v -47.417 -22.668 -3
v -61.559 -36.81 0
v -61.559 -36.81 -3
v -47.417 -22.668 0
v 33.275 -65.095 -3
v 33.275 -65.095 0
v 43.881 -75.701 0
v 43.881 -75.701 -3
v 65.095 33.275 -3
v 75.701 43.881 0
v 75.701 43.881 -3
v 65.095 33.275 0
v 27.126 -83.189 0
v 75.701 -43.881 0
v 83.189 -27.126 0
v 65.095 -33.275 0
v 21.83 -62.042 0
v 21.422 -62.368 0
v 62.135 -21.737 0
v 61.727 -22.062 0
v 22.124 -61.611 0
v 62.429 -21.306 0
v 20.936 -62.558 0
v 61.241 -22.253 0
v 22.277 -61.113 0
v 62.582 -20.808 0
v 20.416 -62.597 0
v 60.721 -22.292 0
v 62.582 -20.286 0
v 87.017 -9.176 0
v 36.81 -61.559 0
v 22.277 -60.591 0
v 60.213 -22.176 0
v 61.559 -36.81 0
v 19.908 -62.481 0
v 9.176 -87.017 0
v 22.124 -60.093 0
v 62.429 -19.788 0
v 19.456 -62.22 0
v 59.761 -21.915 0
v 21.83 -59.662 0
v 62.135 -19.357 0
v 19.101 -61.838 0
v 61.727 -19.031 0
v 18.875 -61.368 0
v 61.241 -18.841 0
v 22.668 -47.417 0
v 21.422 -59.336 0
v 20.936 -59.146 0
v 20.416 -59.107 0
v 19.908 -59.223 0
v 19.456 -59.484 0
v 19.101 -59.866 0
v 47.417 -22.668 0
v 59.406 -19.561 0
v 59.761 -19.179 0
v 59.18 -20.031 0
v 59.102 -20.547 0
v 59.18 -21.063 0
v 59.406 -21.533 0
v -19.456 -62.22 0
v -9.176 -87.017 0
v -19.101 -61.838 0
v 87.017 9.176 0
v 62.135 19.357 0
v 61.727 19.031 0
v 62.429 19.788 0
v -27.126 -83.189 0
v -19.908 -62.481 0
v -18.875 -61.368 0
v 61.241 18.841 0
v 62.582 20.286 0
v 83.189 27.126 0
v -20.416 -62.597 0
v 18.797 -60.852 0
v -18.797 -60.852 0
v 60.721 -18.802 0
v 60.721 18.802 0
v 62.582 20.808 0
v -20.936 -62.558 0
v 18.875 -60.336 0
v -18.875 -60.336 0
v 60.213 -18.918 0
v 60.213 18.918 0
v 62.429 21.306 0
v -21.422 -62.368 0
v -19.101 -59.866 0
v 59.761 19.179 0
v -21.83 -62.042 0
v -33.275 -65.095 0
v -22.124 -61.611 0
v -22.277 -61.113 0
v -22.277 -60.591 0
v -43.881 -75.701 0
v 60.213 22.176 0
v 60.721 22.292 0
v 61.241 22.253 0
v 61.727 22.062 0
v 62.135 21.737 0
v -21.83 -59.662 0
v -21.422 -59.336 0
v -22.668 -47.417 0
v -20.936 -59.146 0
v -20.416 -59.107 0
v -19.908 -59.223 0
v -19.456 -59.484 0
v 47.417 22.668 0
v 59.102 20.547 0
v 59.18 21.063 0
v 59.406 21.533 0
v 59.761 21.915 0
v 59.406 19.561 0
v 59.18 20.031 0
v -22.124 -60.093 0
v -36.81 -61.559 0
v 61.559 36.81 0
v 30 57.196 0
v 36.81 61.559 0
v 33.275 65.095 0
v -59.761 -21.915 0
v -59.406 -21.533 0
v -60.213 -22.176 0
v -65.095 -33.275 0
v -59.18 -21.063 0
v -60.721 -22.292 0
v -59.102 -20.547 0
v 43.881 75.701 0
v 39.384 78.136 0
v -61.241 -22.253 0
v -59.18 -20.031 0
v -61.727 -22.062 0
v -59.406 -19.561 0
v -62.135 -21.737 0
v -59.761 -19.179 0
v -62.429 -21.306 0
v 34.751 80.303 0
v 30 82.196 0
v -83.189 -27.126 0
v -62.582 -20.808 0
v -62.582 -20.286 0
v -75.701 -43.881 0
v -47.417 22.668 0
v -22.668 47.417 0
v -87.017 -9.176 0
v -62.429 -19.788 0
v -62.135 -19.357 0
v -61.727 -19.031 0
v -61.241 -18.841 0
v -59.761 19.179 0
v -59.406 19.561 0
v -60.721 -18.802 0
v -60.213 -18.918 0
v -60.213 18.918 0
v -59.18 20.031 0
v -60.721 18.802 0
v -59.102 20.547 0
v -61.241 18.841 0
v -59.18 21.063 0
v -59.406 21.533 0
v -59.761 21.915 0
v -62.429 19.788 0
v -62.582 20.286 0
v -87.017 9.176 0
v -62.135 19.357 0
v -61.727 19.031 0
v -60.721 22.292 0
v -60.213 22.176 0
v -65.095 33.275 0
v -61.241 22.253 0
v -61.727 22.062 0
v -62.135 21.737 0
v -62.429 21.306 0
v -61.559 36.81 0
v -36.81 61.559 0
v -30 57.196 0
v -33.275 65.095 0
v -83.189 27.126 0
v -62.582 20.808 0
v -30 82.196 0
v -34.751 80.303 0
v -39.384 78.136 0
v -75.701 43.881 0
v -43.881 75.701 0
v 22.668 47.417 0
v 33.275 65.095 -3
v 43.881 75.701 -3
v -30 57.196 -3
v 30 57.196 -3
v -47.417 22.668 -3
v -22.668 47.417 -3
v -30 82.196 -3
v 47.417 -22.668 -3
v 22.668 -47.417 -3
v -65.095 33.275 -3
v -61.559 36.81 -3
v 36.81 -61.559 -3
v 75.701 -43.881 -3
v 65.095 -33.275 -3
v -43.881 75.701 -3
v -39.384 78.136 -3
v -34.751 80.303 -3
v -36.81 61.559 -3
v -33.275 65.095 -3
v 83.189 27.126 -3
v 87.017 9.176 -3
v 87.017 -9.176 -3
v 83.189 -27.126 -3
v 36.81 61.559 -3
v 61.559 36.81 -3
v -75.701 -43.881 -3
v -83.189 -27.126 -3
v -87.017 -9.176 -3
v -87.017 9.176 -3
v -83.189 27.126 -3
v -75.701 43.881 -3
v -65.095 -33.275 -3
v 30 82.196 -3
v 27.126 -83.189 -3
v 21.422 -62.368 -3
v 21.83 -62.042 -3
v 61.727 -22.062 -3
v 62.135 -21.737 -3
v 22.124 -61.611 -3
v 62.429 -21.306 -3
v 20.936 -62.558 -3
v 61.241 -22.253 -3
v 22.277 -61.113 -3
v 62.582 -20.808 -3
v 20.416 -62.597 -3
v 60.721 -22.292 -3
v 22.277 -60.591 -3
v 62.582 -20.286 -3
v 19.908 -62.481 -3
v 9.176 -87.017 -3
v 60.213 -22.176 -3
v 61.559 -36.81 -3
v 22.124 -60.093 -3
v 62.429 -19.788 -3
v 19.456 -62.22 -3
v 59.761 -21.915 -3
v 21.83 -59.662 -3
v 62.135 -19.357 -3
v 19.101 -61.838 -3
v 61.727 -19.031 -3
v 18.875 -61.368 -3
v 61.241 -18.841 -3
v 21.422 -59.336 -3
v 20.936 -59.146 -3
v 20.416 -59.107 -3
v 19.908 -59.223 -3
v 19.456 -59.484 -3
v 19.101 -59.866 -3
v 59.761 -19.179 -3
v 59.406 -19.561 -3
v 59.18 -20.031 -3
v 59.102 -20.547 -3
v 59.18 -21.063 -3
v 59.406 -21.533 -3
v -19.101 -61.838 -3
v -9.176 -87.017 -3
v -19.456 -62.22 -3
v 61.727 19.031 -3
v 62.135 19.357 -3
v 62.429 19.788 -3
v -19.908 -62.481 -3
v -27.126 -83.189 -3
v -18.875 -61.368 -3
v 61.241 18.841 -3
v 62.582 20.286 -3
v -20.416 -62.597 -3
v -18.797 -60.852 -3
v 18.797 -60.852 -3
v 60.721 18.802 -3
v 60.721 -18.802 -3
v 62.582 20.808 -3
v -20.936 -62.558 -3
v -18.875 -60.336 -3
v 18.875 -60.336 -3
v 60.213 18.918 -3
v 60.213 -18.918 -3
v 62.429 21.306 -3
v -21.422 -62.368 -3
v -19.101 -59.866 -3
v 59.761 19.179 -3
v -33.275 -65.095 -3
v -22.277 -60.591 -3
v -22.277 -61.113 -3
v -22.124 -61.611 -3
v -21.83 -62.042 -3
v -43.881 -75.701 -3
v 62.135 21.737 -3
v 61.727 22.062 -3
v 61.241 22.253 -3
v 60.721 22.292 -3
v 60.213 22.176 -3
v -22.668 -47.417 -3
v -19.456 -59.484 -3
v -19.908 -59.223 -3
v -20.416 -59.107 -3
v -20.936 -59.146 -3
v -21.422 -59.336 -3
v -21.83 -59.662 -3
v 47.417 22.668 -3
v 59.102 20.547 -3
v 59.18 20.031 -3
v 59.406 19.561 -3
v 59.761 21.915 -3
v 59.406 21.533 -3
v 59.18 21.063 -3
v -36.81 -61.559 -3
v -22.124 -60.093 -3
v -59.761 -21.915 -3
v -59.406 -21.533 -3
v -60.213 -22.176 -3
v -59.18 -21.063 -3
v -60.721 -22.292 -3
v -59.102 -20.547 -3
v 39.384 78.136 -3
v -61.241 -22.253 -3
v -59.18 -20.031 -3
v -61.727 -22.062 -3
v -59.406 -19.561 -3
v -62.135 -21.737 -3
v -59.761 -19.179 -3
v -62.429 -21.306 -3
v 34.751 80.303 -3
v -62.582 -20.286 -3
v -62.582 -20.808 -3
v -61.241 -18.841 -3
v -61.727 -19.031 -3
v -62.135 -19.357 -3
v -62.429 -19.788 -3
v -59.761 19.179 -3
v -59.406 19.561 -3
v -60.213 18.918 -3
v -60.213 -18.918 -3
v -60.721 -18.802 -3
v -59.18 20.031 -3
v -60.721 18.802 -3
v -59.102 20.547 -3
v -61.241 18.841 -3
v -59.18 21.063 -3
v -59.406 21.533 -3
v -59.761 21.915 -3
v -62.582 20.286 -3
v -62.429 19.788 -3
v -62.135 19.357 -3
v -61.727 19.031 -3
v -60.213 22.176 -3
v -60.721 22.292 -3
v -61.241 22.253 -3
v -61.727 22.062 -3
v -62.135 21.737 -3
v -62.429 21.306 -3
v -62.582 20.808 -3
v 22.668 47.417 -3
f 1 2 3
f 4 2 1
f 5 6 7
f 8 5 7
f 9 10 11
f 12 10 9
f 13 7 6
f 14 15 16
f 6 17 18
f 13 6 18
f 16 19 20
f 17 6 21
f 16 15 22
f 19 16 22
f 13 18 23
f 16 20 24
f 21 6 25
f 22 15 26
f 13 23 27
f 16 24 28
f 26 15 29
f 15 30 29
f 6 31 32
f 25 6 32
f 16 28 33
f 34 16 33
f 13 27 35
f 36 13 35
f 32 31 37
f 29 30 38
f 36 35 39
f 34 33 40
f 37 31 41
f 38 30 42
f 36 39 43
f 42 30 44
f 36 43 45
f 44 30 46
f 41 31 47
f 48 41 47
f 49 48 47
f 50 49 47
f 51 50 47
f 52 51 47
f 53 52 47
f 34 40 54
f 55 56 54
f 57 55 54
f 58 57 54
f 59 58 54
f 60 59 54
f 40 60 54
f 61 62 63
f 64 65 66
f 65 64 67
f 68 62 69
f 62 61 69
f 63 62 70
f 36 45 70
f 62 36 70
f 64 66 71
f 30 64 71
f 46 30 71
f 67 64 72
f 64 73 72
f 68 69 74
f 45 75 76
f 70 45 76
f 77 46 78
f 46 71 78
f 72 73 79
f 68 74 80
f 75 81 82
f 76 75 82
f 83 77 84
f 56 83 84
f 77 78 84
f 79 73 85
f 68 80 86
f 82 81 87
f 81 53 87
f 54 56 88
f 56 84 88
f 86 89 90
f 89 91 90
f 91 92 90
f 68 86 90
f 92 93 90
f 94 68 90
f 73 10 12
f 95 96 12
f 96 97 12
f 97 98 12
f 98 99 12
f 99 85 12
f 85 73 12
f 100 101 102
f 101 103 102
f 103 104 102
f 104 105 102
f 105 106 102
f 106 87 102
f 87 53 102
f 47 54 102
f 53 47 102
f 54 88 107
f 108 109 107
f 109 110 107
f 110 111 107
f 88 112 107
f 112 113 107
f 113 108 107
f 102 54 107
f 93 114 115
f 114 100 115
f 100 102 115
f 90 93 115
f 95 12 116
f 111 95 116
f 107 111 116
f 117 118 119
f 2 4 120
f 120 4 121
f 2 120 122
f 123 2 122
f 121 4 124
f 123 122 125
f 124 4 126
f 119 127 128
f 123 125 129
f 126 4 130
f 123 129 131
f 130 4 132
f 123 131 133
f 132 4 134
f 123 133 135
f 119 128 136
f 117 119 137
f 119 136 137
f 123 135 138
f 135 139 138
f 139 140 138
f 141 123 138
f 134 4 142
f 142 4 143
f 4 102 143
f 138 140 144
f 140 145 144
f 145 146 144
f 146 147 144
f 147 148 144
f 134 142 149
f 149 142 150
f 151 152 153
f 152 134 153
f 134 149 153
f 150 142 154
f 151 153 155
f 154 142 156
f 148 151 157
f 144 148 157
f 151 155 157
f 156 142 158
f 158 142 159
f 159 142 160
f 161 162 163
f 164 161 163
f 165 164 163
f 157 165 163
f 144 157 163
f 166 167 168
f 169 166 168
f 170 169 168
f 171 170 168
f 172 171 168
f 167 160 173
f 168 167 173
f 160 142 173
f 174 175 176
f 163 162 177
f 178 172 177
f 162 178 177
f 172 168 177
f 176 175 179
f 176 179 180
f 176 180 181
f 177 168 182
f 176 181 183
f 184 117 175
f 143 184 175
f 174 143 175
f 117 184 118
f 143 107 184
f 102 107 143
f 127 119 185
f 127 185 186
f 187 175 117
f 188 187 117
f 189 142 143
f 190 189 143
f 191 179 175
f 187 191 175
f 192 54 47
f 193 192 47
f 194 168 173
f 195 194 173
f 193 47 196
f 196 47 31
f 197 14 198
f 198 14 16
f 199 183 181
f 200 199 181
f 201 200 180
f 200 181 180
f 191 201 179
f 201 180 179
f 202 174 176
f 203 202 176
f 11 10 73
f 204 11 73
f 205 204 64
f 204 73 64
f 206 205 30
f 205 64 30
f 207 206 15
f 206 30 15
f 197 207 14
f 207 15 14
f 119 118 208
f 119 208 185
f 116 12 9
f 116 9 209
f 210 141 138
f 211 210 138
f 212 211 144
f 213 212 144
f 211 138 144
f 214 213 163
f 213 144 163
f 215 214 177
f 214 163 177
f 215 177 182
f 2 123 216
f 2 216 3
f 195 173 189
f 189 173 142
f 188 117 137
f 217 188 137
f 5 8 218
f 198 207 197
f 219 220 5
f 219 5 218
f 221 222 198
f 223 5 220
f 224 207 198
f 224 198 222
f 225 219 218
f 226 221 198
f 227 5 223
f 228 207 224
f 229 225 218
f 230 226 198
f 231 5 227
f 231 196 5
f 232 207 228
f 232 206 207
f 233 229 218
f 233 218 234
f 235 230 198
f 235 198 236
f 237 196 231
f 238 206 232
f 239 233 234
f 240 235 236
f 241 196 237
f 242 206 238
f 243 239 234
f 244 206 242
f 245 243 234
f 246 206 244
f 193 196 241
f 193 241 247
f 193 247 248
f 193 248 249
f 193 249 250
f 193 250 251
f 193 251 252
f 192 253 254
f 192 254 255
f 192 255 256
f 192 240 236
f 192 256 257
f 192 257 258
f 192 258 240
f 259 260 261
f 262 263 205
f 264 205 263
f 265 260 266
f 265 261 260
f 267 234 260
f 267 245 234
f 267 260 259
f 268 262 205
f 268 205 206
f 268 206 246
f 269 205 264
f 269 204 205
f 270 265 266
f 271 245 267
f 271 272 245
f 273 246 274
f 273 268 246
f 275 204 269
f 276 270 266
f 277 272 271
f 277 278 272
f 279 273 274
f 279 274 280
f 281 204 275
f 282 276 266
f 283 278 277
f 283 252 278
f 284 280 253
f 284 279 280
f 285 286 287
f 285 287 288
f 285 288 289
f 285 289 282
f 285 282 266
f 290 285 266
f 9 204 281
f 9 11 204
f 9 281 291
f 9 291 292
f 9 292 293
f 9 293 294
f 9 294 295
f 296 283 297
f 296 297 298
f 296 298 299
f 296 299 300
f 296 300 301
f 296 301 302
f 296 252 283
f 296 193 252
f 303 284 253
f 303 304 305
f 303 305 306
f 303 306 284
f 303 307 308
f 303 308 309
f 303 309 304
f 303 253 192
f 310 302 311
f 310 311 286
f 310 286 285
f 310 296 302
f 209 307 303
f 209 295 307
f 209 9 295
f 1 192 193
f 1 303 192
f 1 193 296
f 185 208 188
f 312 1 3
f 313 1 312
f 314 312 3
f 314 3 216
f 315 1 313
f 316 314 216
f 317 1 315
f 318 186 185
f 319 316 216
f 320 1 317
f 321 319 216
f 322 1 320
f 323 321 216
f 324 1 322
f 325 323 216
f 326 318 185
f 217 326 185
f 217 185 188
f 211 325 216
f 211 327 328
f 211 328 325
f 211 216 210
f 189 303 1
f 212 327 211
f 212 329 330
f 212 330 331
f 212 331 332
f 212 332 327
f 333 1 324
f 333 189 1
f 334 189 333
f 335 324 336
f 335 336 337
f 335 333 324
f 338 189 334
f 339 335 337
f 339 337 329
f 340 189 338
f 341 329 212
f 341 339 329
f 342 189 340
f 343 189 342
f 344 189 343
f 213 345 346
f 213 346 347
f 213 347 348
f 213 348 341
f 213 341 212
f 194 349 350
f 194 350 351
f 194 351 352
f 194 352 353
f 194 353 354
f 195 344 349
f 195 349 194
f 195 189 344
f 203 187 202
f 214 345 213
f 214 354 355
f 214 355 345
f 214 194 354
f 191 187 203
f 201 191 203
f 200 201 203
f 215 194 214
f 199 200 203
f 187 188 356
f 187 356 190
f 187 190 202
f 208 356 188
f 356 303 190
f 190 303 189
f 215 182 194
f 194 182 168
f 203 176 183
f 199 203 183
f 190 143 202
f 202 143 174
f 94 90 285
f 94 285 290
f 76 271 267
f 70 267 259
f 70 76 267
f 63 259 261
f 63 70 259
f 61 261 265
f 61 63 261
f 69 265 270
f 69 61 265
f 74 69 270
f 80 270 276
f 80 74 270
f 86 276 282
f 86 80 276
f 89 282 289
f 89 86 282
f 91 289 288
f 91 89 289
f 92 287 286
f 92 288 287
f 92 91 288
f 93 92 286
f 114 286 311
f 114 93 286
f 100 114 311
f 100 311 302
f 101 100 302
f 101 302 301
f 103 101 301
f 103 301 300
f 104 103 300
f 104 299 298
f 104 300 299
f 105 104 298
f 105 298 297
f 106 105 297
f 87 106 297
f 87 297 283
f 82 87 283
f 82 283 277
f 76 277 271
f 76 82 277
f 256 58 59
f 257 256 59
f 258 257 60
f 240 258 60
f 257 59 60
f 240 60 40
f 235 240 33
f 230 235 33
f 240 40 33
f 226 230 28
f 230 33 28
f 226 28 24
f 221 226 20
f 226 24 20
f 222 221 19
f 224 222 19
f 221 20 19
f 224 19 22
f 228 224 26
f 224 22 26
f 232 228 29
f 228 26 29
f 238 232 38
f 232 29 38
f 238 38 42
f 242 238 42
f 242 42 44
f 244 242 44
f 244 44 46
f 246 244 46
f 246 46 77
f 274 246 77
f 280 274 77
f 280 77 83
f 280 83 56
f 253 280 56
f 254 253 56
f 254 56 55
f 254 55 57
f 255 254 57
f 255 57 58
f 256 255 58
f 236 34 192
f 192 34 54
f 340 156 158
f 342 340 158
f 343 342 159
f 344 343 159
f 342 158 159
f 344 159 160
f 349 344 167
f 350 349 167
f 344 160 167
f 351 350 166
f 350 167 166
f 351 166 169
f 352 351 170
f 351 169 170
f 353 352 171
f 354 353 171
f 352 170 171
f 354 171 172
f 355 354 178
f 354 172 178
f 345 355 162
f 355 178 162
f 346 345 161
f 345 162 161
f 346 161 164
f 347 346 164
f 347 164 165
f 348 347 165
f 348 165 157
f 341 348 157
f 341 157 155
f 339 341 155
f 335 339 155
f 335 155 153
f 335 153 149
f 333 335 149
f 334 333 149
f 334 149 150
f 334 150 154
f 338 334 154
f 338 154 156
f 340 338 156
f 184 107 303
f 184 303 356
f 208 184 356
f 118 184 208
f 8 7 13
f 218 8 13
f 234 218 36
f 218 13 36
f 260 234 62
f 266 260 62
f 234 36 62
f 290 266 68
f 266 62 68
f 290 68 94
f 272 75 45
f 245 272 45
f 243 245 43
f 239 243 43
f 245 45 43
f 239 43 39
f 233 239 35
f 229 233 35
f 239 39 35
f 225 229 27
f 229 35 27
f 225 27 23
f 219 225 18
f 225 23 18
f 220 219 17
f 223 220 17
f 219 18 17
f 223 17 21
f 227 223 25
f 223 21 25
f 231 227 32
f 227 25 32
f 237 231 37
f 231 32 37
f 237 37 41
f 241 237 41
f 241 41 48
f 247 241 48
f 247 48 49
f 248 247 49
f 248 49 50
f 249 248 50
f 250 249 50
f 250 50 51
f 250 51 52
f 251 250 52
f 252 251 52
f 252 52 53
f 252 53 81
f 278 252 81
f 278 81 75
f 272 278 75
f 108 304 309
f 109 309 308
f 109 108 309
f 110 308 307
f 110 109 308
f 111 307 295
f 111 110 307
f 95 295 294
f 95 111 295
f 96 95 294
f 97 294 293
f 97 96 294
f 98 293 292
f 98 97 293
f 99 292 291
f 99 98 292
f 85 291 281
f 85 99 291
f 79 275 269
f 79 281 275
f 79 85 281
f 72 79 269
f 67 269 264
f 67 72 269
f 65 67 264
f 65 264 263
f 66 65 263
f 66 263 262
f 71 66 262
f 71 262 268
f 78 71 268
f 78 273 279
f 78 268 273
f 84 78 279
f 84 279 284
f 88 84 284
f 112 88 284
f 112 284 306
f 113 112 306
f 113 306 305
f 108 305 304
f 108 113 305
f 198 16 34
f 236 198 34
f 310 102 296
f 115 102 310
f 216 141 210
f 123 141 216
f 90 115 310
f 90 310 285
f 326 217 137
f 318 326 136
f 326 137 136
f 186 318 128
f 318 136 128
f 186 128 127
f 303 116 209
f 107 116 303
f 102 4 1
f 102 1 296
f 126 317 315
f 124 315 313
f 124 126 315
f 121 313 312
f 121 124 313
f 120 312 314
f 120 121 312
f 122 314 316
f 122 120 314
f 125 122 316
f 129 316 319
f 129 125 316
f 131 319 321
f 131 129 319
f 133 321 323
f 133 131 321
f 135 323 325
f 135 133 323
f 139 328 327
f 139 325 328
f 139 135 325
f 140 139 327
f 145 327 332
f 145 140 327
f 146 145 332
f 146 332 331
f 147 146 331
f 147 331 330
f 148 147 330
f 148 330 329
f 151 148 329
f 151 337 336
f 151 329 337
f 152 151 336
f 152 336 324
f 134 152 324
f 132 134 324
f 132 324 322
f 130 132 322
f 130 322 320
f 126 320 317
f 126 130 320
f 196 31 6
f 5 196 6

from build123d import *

# Parameters (mm, degrees)
BOSS_EXTRUDE1_DEPTH                        = 3
SKETCH3_R                                  = 1.75
CUT_EXTRUDE1_DEPTH                         = 124.780046857
MIRROR1_AT_THE_SECOND_PLANE_COPY_1_SKETC_R = 1.75
MIRROR1_AT_THE_SECOND_PLANE_COPY_1_DEPTH   = 124.780046857


with BuildPart() as part:
    # Sketch1 → Boss-Extrude1 (new body)
    with BuildSketch(Plane.XY):
        with BuildLine():
            Line((-30, 57.196411114), (30, 57.196411114))
            Line((30, 57.196411114), (30, 82.196411114))
            ThreePointArc((30, 82.196411114), (0, -87.5), (-30, 82.196411114))
            Line((-30, 82.196411114), (-30, 57.196411114))
        make_face()
    extrude(amount=-BOSS_EXTRUDE1_DEPTH)

    # Sketch3 → Cut-Extrude1 (cut, through all)
    with BuildSketch(Plane.XY):
        with BuildLine():
            Line((-61.559070668, 36.810333327), (-47.416935045, 22.668197703))
            Line((-47.416935045, 22.668197703), (-22.668197703, 47.416935045))
            Line((-22.668197703, 47.416935045), (-36.810333327, 61.559070668))
            Line((-36.810333327, 61.559070668), (-33.274799421, 65.094604574))
            Line((-33.274799421, 65.094604574), (-43.881401139, 75.701206292))
            ThreePointArc((-43.881401139, 75.701206292), (-61.871843354, 61.871843354), (-75.701206292, 43.881401139))
            Line((-75.701206292, 43.881401139), (-65.094604574, 33.274799421))
            Line((-65.094604574, 33.274799421), (-61.559070668, 36.810333327))
        make_face()
        with Locations((-60.851963887, 20.54687736)):
            Circle(SKETCH3_R)
        with Locations((-20.54687736, 60.851963887)):
            Circle(SKETCH3_R)
    cut_extrude1 = extrude(amount=-CUT_EXTRUDE1_DEPTH, mode=Mode.SUBTRACT)

    # Mirror1: Cut-Extrude1 across plane
    add(cut_extrude1.mirror(Plane(origin=(0, 0, 0), x_dir=(0, 0, 1), z_dir=(1, 0, 0))), mode=Mode.SUBTRACT)

    # Mirror1 at the second plane: Cut-Extrude1 across plane
    add(cut_extrude1.mirror(Plane.ZX), mode=Mode.SUBTRACT)

    # Mirror1 at the second plane copy 1 sketc → Mirror1 at the second plane copy 1 (cut, through all)
    with BuildSketch(Plane(origin=(0, 0, 0), x_dir=(-1, 0, 0), z_dir=(0, 0, 1))):
        with BuildLine():
            Line((-61.559070668, 36.810333327), (-47.416935045, 22.668197703))
            Line((-47.416935045, 22.668197703), (-22.668197703, 47.416935045))
            Line((-22.668197703, 47.416935045), (-36.810333327, 61.559070668))
            Line((-36.810333327, 61.559070668), (-33.274799421, 65.094604574))
            Line((-33.274799421, 65.094604574), (-43.881401139, 75.701206292))
            ThreePointArc((-43.881401139, 75.701206292), (-61.871843354, 61.871843354), (-75.701206292, 43.881401139))
            Line((-75.701206292, 43.881401139), (-65.094604574, 33.274799421))
            Line((-65.094604574, 33.274799421), (-61.559070668, 36.810333327))
        make_face()
        with Locations((-60.851963887, 20.54687736)):
            Circle(MIRROR1_AT_THE_SECOND_PLANE_COPY_1_SKETC_R)
        with Locations((-20.54687736, 60.851963887)):
            Circle(MIRROR1_AT_THE_SECOND_PLANE_COPY_1_SKETC_R)
    extrude(amount=-MIRROR1_AT_THE_SECOND_PLANE_COPY_1_DEPTH, mode=Mode.SUBTRACT)


solid = part.part
